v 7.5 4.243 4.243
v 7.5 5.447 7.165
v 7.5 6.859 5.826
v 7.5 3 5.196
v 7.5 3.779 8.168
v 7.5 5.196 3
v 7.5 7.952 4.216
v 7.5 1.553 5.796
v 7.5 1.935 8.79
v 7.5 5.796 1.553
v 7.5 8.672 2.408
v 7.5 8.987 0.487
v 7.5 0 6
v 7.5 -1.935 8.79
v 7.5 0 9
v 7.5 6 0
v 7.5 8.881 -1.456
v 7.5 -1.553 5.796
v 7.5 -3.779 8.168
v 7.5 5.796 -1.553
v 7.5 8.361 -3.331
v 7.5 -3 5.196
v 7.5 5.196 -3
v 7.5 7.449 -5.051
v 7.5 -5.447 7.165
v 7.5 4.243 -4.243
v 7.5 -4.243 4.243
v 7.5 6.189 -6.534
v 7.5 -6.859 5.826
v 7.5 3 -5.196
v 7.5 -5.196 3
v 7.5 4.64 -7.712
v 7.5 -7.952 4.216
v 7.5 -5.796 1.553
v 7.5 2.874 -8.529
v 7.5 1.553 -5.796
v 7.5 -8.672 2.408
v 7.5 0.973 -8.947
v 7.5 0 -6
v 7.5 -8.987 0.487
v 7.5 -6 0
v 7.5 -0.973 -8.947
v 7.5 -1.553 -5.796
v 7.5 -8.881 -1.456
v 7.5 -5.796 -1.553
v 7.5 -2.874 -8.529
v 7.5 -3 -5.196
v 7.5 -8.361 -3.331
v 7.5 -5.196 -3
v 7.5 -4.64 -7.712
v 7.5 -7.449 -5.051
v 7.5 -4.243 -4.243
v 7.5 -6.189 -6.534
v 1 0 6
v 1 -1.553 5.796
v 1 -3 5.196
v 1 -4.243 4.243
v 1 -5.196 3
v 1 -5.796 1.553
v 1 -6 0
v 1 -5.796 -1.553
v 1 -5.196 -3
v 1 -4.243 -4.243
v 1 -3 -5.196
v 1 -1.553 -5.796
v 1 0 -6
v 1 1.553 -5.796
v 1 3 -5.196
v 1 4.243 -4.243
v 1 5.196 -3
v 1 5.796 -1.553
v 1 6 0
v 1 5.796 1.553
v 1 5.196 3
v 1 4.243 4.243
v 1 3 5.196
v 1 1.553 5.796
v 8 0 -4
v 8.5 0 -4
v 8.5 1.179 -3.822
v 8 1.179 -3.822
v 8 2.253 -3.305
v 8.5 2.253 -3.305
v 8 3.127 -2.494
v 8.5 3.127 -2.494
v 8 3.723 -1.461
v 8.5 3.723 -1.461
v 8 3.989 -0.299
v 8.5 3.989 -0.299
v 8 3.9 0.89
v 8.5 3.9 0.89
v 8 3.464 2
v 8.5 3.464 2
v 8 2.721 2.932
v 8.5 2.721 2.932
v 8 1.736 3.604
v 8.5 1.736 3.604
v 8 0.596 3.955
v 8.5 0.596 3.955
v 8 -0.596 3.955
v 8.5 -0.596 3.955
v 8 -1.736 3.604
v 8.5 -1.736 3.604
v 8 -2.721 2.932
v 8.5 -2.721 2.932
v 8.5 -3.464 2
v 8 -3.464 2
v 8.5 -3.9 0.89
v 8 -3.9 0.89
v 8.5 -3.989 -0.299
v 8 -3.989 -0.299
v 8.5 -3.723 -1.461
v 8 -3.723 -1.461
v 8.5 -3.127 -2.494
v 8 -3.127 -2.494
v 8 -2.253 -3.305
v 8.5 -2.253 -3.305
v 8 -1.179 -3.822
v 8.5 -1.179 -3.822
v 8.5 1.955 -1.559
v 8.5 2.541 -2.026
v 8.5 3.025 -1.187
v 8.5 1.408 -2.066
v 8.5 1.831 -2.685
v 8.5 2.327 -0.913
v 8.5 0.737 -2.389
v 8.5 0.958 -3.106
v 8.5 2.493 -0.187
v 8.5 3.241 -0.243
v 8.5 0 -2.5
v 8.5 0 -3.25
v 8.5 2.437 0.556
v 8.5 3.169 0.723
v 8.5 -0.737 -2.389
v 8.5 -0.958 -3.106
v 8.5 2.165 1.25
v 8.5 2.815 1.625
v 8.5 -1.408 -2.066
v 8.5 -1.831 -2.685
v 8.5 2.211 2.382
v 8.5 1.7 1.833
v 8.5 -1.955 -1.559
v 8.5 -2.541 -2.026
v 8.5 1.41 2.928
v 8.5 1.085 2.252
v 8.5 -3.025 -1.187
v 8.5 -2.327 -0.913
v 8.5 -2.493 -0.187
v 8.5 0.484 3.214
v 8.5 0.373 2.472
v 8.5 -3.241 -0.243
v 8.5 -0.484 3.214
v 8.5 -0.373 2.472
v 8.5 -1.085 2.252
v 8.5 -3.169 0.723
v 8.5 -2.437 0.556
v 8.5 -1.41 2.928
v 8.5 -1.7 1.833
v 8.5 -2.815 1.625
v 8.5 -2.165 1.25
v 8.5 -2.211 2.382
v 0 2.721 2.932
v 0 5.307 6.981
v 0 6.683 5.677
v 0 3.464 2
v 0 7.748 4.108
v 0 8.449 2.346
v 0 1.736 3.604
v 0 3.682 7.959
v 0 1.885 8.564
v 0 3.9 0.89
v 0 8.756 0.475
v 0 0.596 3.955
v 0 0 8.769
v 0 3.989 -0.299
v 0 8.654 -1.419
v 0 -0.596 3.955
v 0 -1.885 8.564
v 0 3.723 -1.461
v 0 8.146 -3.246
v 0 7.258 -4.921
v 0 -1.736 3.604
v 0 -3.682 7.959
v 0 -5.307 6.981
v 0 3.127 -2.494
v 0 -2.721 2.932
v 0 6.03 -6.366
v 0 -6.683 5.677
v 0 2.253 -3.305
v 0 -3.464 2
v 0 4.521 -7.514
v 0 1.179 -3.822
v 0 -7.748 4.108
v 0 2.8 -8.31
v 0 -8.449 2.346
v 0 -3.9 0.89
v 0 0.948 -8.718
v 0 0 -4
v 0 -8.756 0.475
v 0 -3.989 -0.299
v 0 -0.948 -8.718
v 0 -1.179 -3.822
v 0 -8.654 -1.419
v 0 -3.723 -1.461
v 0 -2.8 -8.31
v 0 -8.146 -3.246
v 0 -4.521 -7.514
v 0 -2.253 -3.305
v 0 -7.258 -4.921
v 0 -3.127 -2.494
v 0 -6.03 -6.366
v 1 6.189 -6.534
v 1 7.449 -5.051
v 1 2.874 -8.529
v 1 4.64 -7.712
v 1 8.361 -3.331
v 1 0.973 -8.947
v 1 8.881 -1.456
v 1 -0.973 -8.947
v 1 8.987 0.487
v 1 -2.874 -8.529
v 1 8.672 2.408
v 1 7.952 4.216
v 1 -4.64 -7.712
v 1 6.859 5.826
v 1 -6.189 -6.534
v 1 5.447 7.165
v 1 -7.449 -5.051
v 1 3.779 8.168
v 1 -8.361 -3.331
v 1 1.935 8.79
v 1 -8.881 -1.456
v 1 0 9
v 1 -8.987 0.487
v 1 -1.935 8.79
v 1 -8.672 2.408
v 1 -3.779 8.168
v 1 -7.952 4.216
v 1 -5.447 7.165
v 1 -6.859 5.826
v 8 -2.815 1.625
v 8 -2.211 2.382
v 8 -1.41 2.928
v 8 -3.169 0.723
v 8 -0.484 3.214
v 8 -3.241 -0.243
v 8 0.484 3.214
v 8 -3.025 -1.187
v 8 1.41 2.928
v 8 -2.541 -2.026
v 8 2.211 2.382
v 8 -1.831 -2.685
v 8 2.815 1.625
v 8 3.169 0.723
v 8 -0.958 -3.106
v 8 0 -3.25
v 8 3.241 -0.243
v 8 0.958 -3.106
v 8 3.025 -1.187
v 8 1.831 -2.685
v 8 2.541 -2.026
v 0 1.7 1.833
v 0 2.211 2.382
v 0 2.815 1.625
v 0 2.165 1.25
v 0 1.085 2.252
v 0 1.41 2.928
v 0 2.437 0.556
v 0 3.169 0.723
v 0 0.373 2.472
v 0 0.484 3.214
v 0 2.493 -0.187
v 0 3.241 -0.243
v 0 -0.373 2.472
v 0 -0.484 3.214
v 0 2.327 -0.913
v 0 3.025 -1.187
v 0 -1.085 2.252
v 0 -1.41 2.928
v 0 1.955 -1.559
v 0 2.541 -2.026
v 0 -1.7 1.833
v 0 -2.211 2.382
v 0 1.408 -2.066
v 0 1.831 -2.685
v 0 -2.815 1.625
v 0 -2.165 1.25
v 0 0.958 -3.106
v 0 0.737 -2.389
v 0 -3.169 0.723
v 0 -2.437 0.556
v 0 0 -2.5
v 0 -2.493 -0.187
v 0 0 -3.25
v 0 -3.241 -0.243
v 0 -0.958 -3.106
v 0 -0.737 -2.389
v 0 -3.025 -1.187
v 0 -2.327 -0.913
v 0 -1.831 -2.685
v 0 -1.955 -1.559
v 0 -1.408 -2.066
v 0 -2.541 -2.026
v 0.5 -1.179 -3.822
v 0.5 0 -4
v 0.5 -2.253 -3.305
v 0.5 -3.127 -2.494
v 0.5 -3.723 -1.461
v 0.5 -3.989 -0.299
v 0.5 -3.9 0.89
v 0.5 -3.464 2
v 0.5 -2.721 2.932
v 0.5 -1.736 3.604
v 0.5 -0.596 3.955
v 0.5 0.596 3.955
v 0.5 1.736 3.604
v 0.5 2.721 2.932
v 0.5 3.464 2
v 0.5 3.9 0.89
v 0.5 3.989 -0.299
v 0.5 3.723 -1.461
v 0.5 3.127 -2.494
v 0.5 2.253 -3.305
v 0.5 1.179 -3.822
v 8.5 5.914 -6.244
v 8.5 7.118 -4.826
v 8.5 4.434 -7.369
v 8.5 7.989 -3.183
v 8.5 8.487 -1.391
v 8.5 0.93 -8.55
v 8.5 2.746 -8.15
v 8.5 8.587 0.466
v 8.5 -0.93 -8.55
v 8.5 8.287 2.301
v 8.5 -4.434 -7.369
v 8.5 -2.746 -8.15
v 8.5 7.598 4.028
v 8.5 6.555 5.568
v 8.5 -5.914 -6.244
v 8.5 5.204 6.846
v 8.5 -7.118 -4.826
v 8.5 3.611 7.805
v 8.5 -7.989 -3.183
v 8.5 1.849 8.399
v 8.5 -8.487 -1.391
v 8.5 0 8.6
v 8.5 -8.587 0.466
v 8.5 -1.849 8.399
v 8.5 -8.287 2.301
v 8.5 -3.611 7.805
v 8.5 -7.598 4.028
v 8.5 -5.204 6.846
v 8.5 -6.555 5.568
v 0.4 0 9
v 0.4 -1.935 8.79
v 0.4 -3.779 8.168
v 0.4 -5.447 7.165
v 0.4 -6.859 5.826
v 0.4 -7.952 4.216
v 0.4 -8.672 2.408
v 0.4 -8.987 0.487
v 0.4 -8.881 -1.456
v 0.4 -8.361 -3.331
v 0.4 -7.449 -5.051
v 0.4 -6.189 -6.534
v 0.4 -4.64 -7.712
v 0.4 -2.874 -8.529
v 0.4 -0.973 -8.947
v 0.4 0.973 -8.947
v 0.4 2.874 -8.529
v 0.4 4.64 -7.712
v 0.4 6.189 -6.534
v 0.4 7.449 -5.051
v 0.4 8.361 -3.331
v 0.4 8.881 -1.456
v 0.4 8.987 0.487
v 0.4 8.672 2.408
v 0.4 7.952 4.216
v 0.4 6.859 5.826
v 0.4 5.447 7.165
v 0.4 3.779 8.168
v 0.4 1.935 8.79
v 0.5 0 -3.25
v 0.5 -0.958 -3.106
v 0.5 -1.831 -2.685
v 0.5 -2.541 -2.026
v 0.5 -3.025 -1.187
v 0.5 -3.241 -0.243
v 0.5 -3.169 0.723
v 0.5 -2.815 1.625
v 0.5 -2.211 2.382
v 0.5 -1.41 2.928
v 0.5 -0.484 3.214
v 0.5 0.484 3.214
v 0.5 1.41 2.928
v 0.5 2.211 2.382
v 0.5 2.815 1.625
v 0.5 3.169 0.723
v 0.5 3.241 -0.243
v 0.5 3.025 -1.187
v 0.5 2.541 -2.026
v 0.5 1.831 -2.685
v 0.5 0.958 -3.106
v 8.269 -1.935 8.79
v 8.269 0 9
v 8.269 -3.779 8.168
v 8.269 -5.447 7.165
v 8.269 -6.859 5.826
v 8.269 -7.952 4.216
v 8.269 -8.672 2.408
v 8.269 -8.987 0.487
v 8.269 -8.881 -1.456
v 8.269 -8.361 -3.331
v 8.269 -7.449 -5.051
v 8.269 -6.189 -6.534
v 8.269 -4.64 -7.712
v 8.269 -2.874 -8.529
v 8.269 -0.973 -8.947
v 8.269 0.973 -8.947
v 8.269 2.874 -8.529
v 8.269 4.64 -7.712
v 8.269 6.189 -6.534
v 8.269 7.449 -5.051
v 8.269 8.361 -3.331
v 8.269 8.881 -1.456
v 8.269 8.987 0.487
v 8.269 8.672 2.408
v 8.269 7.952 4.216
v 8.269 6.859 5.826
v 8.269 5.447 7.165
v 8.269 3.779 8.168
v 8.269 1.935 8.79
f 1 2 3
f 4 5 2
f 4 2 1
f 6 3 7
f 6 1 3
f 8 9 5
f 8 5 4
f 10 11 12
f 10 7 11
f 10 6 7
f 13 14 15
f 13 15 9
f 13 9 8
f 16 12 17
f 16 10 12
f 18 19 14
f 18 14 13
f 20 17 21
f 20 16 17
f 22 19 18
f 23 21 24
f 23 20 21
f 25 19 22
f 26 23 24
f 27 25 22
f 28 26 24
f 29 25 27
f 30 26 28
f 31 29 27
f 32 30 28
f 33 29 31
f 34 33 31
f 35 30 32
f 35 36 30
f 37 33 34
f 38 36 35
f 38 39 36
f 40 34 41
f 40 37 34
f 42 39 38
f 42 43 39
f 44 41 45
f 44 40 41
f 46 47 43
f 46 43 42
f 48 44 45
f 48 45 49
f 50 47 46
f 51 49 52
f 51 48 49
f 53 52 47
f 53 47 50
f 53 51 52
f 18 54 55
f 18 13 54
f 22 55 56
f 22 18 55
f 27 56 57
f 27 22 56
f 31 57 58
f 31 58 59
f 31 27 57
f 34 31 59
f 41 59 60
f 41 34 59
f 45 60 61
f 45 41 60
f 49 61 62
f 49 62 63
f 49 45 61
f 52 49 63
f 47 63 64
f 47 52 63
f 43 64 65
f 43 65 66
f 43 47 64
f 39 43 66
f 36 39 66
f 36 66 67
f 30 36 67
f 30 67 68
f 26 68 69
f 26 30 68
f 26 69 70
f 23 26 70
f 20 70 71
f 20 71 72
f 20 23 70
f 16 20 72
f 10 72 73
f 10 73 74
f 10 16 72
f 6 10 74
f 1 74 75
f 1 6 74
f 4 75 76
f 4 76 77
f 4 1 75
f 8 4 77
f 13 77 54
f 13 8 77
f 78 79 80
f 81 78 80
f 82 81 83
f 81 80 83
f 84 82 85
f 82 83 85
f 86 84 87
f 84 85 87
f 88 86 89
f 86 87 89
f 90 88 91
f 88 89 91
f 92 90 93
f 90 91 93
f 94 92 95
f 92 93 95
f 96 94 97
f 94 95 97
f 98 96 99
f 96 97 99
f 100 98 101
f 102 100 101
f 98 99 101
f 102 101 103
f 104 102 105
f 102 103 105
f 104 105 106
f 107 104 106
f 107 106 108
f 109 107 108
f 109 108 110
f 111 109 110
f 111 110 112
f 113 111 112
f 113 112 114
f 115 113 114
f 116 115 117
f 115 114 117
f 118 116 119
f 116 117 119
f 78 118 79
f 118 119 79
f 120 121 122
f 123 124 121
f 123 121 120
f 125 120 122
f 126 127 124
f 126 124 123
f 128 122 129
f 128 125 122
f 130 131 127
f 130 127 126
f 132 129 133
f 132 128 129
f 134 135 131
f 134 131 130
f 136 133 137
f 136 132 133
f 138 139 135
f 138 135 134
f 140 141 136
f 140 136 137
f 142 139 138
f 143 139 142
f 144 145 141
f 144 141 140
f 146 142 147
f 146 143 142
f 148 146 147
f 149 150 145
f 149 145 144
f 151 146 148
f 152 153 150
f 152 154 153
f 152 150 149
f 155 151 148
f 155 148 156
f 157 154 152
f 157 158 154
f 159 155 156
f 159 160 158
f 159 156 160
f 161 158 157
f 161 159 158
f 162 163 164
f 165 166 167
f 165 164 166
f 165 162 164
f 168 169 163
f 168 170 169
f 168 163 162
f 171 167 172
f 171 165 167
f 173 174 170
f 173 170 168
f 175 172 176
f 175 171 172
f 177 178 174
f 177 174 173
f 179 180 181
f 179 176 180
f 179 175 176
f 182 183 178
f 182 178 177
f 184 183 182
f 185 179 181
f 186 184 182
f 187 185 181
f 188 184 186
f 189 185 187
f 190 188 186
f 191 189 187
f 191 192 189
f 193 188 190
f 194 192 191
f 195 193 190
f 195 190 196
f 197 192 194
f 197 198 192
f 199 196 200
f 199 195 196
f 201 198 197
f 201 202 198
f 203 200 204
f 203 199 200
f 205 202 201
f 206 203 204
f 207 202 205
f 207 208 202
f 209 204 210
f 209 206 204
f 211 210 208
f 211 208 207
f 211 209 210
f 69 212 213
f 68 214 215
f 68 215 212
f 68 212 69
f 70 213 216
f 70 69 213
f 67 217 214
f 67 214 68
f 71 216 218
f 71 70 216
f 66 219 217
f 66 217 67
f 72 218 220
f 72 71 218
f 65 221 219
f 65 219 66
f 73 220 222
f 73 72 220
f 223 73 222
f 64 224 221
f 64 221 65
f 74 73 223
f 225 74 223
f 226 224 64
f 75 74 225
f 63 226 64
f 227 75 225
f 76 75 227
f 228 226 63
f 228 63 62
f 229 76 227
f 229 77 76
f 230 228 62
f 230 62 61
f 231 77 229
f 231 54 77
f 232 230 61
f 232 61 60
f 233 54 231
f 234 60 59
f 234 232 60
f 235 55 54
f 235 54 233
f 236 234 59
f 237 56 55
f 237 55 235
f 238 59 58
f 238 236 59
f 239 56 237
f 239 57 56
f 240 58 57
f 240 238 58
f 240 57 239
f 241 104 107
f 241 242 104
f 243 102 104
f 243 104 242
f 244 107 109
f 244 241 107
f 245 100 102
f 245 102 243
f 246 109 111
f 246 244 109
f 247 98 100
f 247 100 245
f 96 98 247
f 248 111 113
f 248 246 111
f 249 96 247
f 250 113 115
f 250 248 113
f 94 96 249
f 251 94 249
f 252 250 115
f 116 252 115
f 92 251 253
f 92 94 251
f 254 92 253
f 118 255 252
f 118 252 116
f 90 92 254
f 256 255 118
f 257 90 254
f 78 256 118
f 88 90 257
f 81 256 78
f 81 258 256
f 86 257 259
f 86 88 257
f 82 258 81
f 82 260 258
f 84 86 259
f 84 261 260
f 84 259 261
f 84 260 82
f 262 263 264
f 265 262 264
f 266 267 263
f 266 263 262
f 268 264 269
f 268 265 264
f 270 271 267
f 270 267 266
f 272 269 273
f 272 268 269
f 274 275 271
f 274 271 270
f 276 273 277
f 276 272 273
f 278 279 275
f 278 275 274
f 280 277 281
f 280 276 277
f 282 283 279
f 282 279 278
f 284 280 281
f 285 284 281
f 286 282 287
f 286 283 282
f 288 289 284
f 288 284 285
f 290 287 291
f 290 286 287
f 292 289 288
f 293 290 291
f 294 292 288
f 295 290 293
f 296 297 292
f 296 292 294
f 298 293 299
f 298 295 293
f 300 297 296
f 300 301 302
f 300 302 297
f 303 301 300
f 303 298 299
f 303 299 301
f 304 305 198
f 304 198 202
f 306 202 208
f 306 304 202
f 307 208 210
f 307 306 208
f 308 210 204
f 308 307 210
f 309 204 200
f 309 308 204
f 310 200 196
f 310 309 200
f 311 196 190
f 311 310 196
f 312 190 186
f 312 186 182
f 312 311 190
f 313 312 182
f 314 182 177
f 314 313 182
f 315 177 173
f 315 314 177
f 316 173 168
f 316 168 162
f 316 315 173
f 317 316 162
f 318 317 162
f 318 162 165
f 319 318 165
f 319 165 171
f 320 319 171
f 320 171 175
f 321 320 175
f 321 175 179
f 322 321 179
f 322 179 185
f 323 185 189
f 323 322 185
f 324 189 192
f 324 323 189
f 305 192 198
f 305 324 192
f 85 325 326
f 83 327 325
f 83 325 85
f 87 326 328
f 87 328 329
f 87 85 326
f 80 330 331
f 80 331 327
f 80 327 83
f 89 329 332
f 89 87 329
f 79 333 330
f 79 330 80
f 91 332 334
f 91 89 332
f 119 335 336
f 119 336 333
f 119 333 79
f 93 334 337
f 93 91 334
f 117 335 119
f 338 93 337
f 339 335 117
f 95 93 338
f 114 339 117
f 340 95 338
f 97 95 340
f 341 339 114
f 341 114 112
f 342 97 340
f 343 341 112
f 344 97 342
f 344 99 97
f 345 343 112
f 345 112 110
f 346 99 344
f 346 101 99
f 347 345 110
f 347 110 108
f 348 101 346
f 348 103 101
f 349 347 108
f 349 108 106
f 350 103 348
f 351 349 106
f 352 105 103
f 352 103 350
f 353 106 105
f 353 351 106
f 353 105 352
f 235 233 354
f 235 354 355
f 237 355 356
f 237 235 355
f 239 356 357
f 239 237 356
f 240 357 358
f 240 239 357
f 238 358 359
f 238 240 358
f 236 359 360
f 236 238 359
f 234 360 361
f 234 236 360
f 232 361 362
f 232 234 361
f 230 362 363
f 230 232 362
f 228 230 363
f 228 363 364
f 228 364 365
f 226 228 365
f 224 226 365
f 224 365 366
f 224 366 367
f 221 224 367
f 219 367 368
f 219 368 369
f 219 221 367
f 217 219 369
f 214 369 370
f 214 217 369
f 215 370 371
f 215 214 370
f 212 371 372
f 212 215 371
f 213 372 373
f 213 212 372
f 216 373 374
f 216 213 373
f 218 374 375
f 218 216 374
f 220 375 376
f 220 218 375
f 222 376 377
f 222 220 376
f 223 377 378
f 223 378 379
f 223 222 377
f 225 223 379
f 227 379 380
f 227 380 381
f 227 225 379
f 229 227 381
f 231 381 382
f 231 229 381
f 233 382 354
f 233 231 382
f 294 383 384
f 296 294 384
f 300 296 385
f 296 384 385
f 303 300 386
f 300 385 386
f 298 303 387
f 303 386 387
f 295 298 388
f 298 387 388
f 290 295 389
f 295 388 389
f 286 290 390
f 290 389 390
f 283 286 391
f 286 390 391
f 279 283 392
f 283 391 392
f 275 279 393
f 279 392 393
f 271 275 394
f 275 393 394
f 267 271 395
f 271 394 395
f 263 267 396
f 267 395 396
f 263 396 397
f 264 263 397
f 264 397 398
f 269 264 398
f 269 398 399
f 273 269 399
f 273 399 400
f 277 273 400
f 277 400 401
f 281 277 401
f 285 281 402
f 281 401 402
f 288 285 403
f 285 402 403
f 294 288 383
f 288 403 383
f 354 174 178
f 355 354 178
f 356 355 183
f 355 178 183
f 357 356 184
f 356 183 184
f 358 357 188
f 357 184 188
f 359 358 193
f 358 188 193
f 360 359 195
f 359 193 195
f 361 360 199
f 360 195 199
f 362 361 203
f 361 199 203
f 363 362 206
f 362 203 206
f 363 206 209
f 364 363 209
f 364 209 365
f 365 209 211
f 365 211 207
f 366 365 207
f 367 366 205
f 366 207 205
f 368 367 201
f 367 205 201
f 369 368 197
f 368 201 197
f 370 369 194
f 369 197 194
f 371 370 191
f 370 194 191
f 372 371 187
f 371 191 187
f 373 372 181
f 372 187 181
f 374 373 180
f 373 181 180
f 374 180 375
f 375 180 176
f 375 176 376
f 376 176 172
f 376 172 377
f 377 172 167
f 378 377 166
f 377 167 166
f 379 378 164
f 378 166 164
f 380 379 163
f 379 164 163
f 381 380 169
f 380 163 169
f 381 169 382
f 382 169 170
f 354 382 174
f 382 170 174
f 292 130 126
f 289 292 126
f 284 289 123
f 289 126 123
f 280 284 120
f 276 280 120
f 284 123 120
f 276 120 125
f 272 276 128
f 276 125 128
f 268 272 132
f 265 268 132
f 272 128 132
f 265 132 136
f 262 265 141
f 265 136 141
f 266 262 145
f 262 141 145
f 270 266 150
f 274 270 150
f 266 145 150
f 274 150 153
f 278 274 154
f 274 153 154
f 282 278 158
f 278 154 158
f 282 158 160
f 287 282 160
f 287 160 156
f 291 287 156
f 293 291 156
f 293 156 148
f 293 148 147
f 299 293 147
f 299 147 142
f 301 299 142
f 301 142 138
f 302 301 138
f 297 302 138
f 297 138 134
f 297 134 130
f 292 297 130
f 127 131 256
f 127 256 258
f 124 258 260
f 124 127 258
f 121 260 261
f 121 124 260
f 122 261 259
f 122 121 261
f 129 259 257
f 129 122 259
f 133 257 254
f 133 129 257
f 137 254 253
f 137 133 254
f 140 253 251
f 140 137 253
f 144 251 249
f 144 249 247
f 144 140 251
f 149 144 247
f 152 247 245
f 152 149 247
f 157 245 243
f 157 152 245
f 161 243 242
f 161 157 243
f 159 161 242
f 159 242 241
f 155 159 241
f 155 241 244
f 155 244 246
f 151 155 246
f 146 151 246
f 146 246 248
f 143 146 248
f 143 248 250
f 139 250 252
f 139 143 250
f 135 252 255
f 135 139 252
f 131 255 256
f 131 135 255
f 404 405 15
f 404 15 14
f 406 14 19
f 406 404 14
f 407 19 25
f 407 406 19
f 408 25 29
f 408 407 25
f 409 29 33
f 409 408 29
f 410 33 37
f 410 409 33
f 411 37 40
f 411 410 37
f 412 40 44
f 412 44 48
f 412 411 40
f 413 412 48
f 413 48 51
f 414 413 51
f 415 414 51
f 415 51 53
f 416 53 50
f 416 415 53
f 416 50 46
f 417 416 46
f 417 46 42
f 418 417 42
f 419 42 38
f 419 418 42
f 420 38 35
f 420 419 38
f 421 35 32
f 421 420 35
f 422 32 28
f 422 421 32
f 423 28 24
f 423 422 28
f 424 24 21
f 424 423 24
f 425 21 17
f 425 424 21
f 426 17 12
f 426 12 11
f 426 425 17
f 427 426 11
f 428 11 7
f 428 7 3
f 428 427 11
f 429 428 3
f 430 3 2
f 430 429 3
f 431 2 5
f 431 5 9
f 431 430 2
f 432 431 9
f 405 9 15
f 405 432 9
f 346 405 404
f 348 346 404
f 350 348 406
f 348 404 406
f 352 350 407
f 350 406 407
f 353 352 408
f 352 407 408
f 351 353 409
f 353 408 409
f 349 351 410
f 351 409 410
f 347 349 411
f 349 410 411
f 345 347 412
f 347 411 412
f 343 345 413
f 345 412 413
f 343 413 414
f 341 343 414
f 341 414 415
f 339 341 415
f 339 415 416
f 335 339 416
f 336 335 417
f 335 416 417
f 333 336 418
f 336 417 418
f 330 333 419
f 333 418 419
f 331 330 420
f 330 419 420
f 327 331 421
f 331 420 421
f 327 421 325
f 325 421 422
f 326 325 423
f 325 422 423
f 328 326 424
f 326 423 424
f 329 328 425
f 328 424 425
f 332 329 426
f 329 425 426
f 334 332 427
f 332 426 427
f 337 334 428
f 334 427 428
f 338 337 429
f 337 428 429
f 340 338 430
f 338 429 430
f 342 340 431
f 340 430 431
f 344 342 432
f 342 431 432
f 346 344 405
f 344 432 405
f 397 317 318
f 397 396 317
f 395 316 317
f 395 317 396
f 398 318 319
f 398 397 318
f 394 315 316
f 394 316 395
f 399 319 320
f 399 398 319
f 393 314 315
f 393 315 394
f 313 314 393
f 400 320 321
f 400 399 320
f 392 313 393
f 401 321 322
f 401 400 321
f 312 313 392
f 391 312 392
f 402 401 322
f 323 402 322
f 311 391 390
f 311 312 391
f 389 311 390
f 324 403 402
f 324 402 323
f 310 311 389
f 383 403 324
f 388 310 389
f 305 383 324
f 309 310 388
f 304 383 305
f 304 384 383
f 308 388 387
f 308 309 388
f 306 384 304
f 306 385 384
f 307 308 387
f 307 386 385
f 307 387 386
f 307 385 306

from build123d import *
from OCP.BRepFilletAPI import BRepFilletAPI_MakeChamfer

# Parameters (mm, degrees)
CHAMFER1_SIZE      = 0.4
CHAMFER1_SIZE2     = 0.230940108
SKETCH2_R          = 2.5
CUT_EXTRUDE1_DEPTH = 16.305227865
SKETCH3_R          = 4
SKETCH3_R_2        = 3.25
CUT_EXTRUDE2_DEPTH = 0.5
CUT_EXTRUDE3_START = -0.5
SKETCH4_R          = 4
SKETCH4_R_2        = 3.25
CUT_EXTRUDE3_DEPTH = 0.5


with BuildPart() as part:
    # Sketch1 → Revolve1 (revolve)
    with BuildSketch(Plane.XY, mode=Mode.PRIVATE) as revolve1_sk:
        Polygon((0, 0), (0, 9), (1, 9), (1, 6), (7.5, 6), (7.5, 9), (8.5, 9), (8.5, 0), align=None)
    revolve(revolve1_sk.sketch.rotate(Axis((0, 0, 0), (1, 0, 0)), 90), axis=Axis((0, 0, 0), (1, 0, 0)))

    # Chamfer1: one chamfer whose edges measure the first distance from different faces: ONE call of the kernel's chamfer builder (chamfer() names one face for all edges)
    chamfer1_edges_1 = [part.edges().sort_by_distance(p)[0] for p in [
        (8.5, 0, -9),
    ]]
    chamfer1_side_1 = [part.faces().sort_by_distance(p)[0] for p in [
        (8.5, 0, 0),
    ]]
    chamfer1_edges_2 = [part.edges().sort_by_distance(p)[0] for p in [
        (0, 0, -9),
    ]]
    chamfer1_side_2 = [part.faces().sort_by_distance(p)[0] for p in [
        (0.5, 0, -9),
    ]]
    chamfer1 = BRepFilletAPI_MakeChamfer(part.part.solid().wrapped)
    for e in chamfer1_edges_1:
        chamfer1.Add(CHAMFER1_SIZE, CHAMFER1_SIZE2, e.wrapped, chamfer1_side_1[0].wrapped)  # the first distance lies on this face
    for e in chamfer1_edges_2:
        chamfer1.Add(CHAMFER1_SIZE, CHAMFER1_SIZE2, e.wrapped, chamfer1_side_2[0].wrapped)  # the first distance lies on this face
    add(Compound.cast(chamfer1.Shape()), mode=Mode.REPLACE)

    # Sketch2 → Cut-Extrude1 (cut, through all)
    with BuildSketch(Plane(origin=(8.5, 0, 0), x_dir=(0, 0, -1), z_dir=(1, 0, 0))):
        Circle(SKETCH2_R)
    extrude(amount=-CUT_EXTRUDE1_DEPTH, mode=Mode.SUBTRACT)

    # Sketch3 → Cut-Extrude2 (cut)
    with BuildSketch(Plane(origin=(8.5, 0, 0), x_dir=(0, 0, -1), z_dir=(1, 0, 0))):
        Circle(SKETCH3_R)
        Circle(SKETCH3_R_2, mode=Mode.SUBTRACT)
    extrude(amount=-CUT_EXTRUDE2_DEPTH, mode=Mode.SUBTRACT)

    # Sketch4 → Cut-Extrude3 (cut)
    with BuildSketch(Plane.ZY.offset(CUT_EXTRUDE3_START)):
        with Locations(Location((0, 0, 0), (0, 0, 180))):
            Circle(SKETCH4_R)
        with Locations(Location((0, 0, 0), (0, 0, 180))):
            Circle(SKETCH4_R_2, mode=Mode.SUBTRACT)
    extrude(amount=CUT_EXTRUDE3_DEPTH, mode=Mode.SUBTRACT)


solid = part.part
